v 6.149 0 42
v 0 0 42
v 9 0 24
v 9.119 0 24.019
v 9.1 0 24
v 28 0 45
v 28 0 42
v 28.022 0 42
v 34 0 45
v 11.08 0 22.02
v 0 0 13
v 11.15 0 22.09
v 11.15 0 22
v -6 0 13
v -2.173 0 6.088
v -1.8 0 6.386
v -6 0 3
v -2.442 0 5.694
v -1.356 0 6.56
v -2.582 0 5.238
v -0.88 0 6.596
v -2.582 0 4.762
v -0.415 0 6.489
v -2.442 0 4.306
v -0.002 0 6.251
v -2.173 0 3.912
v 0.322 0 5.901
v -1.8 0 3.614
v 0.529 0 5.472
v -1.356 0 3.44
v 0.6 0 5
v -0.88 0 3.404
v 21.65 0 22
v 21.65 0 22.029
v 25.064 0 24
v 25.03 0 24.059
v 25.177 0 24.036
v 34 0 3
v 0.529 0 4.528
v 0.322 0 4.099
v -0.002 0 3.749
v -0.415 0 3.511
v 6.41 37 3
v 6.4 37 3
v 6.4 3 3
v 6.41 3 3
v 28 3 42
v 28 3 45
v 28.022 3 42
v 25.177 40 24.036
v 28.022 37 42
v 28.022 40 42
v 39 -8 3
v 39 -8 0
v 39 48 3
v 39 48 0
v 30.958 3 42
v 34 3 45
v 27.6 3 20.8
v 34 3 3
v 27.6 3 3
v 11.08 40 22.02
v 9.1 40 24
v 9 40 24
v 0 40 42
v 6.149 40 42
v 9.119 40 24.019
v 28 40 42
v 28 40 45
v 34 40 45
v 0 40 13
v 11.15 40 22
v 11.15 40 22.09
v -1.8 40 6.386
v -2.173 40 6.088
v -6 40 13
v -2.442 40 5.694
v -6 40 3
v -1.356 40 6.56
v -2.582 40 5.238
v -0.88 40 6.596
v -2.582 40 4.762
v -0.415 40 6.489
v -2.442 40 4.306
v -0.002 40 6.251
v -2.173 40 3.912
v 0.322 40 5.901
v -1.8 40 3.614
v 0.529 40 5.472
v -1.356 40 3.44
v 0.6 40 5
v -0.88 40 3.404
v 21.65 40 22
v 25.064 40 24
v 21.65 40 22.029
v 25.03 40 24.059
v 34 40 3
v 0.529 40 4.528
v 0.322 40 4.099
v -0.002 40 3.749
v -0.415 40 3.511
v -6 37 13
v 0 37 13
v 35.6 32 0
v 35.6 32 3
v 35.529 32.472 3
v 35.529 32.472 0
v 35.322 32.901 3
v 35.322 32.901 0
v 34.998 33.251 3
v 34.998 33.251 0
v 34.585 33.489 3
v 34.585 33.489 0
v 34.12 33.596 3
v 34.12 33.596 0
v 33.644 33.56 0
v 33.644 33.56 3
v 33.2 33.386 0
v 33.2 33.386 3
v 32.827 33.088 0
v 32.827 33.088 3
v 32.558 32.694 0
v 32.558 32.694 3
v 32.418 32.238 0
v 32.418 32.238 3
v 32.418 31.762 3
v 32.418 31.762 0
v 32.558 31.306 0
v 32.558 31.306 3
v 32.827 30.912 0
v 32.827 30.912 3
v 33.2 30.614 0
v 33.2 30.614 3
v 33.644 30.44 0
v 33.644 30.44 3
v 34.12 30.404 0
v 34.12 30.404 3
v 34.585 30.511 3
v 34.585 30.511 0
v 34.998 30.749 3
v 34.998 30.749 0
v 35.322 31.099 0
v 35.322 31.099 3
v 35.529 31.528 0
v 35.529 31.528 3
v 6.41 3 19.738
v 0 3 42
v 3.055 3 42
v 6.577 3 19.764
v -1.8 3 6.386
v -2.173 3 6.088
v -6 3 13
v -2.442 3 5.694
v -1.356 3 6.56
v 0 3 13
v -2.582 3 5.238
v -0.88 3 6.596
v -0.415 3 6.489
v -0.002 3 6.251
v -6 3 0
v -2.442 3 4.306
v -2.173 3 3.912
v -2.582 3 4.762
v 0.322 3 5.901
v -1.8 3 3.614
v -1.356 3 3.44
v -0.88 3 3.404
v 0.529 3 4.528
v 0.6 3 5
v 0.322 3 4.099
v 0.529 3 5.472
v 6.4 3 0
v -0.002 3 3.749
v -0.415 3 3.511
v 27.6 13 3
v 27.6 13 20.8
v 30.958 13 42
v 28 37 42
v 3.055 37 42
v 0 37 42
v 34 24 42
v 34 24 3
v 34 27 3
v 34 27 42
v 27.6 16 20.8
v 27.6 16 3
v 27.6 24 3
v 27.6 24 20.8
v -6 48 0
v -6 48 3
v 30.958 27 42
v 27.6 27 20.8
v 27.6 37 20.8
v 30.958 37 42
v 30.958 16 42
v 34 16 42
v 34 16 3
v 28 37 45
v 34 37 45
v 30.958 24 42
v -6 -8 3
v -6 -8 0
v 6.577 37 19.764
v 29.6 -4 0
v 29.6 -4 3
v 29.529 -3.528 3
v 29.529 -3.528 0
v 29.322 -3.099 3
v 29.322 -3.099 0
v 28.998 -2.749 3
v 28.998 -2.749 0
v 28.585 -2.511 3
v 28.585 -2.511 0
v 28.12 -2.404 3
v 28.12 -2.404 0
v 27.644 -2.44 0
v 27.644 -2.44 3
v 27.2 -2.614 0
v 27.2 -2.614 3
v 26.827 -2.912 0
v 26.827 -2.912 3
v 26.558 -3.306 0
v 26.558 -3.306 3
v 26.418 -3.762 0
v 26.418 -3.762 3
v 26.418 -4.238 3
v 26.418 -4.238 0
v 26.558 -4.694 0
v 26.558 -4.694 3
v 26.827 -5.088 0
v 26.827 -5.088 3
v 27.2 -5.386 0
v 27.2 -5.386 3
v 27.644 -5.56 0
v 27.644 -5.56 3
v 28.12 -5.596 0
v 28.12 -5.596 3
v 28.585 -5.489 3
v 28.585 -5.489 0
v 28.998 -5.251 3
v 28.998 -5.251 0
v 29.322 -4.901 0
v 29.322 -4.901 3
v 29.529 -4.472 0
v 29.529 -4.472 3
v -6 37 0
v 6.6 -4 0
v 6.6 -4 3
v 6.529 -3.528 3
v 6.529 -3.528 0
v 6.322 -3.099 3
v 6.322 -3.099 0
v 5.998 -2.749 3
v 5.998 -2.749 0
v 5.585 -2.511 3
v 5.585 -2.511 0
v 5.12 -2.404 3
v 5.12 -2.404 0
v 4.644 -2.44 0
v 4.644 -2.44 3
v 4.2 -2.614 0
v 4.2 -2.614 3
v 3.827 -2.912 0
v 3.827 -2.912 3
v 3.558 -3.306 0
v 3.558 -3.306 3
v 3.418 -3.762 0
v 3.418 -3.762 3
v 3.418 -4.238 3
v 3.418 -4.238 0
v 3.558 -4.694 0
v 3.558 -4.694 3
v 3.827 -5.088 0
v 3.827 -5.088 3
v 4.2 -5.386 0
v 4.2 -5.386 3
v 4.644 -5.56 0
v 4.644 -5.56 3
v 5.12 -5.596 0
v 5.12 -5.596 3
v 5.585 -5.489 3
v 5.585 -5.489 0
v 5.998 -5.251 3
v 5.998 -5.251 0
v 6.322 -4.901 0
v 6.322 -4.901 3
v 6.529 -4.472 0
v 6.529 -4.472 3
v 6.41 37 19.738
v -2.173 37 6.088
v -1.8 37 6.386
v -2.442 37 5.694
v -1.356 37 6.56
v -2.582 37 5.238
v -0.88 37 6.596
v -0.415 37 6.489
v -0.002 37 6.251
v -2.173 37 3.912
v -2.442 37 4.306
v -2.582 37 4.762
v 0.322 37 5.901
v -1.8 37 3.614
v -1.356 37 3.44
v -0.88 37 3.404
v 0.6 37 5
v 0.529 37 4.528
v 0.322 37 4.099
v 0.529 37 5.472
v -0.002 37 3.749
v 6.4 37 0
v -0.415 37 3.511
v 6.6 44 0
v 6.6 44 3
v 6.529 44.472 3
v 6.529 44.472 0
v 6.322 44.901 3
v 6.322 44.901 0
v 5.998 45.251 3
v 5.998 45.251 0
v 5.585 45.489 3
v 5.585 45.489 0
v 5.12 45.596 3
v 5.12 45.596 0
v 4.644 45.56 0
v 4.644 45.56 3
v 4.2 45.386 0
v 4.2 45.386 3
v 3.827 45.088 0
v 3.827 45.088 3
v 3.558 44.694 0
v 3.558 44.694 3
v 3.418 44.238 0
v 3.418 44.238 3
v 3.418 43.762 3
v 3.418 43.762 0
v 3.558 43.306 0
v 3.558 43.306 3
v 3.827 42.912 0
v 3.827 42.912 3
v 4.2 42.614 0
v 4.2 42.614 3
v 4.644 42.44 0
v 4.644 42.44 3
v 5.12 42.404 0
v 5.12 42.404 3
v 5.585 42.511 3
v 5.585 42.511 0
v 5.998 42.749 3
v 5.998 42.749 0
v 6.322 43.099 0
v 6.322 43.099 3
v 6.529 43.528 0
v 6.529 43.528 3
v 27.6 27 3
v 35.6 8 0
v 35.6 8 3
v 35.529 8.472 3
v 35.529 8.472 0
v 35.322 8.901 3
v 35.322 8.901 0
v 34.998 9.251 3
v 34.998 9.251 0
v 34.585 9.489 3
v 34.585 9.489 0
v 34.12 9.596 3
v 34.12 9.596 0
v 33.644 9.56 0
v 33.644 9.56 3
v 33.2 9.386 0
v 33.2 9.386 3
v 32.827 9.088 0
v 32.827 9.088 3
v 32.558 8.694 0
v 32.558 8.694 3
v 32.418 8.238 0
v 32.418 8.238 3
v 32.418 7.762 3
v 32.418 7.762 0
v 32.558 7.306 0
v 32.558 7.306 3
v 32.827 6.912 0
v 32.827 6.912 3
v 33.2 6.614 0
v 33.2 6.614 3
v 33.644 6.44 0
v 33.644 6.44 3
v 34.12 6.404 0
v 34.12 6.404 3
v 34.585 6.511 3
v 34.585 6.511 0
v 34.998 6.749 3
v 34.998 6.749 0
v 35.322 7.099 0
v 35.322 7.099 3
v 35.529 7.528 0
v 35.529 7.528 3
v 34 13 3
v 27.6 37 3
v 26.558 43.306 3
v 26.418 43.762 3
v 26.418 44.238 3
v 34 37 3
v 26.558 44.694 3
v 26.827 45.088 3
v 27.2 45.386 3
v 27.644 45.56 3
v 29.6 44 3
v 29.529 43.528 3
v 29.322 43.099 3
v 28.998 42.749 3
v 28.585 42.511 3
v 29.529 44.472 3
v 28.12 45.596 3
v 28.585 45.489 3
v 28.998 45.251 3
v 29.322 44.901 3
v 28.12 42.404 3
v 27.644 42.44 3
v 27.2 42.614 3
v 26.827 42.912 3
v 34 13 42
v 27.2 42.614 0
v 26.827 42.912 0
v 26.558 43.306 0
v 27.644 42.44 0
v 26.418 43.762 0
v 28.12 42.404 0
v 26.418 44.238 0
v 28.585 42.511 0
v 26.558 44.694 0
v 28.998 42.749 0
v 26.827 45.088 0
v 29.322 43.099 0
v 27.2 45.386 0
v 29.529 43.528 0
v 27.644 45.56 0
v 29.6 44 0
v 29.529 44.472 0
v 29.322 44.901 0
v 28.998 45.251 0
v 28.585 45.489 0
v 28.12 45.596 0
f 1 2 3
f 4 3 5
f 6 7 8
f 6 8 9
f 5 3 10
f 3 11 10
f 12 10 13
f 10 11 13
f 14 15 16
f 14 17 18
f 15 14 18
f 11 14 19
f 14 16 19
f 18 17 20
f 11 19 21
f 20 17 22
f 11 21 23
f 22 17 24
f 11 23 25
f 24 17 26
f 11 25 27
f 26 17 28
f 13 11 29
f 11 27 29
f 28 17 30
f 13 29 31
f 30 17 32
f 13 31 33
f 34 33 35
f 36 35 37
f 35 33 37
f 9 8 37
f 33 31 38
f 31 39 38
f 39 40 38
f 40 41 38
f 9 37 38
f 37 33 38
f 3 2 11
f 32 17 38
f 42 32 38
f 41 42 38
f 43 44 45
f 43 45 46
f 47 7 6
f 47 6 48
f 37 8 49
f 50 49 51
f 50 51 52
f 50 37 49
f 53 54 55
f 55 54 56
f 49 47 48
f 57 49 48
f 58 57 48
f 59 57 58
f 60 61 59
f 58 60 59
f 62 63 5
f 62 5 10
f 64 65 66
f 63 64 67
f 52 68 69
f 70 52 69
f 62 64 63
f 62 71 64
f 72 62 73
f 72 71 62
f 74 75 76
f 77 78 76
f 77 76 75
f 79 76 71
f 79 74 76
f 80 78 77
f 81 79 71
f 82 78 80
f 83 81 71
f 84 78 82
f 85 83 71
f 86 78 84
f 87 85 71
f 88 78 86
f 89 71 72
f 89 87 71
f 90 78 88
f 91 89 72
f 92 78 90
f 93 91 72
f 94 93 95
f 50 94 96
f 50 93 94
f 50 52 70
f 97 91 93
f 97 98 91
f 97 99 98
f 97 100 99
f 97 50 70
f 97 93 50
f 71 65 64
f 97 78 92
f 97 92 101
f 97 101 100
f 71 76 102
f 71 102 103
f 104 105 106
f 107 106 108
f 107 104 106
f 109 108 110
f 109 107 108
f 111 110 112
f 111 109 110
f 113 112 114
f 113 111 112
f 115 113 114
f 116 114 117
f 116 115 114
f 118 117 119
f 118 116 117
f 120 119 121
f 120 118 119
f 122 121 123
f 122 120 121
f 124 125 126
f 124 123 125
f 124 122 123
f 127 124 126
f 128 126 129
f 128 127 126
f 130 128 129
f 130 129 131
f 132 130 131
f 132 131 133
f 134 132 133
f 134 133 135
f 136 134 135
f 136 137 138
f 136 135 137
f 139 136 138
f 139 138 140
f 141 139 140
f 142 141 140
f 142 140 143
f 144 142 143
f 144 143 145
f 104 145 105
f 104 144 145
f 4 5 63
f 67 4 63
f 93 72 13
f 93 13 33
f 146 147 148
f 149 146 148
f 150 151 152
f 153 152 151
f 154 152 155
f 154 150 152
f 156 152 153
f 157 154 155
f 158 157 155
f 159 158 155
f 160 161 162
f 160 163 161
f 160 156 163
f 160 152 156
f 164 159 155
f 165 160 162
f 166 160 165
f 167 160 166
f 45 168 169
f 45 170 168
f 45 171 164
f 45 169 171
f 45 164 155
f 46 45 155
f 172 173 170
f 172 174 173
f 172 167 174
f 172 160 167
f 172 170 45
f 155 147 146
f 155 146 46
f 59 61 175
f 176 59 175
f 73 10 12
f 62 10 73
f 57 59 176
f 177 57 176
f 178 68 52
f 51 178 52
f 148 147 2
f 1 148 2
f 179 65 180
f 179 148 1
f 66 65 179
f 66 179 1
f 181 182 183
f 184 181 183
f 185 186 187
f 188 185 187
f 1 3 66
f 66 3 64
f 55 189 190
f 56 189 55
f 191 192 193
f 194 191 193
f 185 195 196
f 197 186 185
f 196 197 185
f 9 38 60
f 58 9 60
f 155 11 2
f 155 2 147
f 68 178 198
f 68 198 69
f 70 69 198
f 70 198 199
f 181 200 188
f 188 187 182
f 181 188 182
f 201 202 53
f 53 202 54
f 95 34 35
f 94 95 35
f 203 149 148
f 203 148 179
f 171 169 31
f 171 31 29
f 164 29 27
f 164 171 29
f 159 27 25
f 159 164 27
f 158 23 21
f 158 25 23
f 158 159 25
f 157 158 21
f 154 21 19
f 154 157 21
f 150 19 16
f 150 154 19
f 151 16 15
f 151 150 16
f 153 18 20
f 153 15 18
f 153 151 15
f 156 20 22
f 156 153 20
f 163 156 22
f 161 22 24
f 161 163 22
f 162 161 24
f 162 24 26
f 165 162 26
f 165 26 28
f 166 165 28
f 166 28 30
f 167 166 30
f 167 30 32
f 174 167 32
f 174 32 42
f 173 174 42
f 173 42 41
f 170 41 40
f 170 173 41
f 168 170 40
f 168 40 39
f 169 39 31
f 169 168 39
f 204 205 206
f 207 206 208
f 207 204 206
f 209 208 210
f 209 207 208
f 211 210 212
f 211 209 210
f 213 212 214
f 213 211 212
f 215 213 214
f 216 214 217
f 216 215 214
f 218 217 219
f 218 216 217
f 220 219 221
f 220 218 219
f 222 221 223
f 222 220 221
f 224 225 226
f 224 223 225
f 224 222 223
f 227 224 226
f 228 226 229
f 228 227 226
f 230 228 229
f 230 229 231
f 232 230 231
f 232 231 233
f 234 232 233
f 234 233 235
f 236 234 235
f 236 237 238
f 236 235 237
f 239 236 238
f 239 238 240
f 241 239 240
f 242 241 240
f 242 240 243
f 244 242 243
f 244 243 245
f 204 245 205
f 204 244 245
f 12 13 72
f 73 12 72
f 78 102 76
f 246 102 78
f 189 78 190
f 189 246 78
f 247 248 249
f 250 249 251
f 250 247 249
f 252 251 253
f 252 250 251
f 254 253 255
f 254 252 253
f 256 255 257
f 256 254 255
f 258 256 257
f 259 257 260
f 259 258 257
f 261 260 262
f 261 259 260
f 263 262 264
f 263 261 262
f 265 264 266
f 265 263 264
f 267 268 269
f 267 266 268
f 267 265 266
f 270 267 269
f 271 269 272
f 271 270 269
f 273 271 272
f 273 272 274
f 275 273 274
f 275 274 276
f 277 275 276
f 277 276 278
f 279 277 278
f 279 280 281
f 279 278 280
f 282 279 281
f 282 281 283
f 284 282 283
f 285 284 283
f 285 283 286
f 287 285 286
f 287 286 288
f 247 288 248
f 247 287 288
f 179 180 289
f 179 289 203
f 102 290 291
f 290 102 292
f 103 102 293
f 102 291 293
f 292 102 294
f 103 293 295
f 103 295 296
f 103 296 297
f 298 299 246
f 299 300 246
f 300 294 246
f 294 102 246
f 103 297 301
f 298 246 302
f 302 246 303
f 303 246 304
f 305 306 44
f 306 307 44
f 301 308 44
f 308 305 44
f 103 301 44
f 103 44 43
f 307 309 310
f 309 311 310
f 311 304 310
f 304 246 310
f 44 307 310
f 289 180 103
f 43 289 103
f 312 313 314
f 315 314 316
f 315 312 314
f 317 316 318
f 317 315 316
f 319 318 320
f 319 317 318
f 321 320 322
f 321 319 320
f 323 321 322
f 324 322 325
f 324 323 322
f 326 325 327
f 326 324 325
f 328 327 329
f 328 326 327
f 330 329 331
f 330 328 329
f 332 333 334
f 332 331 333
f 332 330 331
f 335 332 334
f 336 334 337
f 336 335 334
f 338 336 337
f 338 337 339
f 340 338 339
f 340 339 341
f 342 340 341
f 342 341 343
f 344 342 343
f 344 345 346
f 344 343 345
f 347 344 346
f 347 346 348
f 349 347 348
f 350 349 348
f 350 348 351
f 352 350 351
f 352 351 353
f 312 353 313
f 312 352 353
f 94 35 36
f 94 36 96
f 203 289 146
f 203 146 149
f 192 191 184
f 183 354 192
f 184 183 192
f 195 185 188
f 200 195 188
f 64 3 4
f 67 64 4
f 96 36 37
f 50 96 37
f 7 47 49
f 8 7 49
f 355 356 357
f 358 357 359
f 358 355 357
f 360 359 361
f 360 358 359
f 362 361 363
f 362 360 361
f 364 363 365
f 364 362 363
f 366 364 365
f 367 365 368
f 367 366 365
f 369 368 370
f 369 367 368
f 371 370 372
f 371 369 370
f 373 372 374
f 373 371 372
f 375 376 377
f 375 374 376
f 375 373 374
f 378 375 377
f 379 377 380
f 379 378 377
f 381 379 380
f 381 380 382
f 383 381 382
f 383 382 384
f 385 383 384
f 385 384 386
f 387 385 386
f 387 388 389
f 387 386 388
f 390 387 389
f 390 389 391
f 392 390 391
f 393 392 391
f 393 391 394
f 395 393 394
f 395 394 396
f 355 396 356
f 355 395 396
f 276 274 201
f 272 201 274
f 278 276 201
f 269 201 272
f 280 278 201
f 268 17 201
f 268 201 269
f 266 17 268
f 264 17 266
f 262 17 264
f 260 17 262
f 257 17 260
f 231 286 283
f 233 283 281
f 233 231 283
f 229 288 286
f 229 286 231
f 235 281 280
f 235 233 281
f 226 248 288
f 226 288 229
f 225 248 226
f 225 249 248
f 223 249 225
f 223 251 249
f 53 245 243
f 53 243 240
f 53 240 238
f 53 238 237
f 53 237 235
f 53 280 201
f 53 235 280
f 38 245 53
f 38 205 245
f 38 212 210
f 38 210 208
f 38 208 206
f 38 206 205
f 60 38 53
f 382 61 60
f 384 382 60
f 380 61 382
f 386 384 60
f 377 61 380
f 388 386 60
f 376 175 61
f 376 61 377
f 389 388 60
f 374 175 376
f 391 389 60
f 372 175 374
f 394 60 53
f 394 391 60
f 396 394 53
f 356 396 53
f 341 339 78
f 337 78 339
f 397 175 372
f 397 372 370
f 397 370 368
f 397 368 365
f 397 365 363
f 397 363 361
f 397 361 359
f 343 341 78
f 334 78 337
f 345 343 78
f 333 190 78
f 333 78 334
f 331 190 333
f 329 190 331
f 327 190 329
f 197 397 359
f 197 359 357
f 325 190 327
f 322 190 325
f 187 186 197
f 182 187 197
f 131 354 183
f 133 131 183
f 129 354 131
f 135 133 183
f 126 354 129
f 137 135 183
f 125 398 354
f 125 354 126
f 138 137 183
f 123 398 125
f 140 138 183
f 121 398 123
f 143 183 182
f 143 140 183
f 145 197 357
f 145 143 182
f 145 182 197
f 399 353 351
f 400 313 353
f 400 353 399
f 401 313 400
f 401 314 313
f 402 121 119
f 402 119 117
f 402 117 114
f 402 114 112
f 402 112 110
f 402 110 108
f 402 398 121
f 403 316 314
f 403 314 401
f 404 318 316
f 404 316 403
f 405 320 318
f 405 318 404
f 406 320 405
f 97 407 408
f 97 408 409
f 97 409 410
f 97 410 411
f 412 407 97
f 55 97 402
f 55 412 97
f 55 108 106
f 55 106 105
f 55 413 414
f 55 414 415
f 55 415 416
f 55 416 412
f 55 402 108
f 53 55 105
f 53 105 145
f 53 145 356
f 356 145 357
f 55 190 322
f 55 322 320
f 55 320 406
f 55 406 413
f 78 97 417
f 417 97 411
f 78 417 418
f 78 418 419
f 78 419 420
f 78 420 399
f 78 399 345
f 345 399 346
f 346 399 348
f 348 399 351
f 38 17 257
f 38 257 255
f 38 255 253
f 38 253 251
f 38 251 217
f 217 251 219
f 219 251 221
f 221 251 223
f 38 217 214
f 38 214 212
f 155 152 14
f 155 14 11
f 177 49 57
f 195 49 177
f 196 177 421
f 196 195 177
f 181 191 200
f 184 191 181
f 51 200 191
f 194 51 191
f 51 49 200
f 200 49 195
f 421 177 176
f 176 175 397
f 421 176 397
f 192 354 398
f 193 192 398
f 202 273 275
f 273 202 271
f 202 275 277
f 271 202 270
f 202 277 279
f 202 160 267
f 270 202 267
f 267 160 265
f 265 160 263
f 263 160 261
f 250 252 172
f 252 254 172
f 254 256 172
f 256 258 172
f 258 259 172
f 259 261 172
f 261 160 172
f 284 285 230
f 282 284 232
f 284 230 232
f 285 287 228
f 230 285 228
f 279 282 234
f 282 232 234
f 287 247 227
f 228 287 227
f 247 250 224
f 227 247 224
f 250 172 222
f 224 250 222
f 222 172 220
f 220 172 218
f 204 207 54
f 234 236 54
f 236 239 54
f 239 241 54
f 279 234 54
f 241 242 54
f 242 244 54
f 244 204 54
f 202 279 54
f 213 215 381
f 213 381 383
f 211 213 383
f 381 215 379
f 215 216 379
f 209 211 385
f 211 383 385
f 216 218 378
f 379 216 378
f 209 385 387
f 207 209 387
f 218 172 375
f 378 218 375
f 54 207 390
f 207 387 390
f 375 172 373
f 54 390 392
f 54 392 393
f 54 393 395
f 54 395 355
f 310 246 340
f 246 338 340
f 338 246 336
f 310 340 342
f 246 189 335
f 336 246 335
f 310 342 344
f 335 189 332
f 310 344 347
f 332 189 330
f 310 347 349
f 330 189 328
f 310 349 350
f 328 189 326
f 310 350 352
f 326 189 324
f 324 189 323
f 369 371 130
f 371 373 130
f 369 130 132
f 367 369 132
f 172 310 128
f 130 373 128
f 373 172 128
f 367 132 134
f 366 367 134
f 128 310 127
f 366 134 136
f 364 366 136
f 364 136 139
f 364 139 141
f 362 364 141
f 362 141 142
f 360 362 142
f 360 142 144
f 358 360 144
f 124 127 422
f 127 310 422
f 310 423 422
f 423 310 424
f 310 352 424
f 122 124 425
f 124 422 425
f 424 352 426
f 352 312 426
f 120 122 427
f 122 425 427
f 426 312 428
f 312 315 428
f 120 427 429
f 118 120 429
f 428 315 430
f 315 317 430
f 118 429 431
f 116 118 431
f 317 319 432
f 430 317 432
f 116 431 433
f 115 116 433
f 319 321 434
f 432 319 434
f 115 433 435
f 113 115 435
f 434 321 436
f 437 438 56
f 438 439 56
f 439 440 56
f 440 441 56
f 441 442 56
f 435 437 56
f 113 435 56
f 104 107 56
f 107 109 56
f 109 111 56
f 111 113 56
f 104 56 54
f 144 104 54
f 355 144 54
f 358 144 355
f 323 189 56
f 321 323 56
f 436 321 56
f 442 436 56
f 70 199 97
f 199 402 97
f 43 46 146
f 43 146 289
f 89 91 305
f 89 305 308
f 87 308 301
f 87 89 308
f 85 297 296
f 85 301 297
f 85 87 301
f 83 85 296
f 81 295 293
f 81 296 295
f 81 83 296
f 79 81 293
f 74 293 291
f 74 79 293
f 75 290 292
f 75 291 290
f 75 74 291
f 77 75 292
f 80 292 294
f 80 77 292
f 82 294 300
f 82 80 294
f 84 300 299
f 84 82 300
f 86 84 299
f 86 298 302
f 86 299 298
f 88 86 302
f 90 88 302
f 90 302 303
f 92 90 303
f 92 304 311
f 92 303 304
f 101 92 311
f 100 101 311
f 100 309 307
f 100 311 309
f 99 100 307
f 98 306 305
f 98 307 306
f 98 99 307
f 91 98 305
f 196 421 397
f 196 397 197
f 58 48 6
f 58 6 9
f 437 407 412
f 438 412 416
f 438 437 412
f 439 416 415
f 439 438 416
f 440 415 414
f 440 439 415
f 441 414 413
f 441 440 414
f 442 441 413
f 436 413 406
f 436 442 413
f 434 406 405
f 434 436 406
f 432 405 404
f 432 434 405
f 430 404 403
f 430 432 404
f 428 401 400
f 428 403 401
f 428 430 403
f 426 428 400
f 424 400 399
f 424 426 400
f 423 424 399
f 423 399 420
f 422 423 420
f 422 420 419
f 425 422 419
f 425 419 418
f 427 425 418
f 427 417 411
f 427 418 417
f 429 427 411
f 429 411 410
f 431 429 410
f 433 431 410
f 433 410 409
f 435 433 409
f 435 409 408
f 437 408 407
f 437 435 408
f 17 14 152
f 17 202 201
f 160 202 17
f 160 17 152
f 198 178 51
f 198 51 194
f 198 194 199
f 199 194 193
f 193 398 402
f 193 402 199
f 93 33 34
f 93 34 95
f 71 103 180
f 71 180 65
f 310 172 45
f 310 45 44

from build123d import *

# Parameters (mm, degrees)
CYLINDER007_R          = 1.6
CYLINDER007_DEPTH      = 10
CYLINDER006_R          = 1.6
CYLINDER006_DEPTH      = 10
CYLINDER005_R          = 1.6
CYLINDER005_DEPTH      = 10
CYLINDER004_R          = 1.6
CYLINDER004_DEPTH      = 10
CYLINDER_R             = 1.6
CYLINDER_DEPTH         = 50
CYLINDER_ROLL_ANGLE    = 90
BOX024_W               = 6
BOX024_H               = 3
BOX024_DEPTH           = 10
BOX023_W               = 6
BOX023_H               = 3
BOX023_DEPTH           = 10
BOX021_W               = 6
BOX021_H               = 3
BOX021_DEPTH           = 3
BOX022_W               = 13
BOX022_H               = 34
BOX022_DEPTH           = 3
CYLINDER003_R          = 1.6
CYLINDER003_DEPTH      = 10
CYLINDER002_R          = 1.6
CYLINDER002_DEPTH      = 10
BOX019_W               = 45
BOX019_H               = 56
BOX019_DEPTH           = 3
BOX018_W               = 10
BOX018_H               = 10
BOX018_DEPTH           = 23
BOX018_PITCH_ANGLE     = 9
BOX013_W               = 8.6
BOX013_H               = 10
BOX013_DEPTH           = 17.8
BOX017_W               = 10
BOX017_H               = 8
BOX017_DEPTH           = 23
BOX017_PITCH_ANGLE     = 9
BOX012_W               = 8.6
BOX012_H               = 8
BOX012_DEPTH           = 17.8
BOX016_W               = 10
BOX016_H               = 10
BOX016_DEPTH           = 23
BOX016_PITCH_ANGLE     = 9
BOX011_W               = 8.6
BOX011_H               = 10
BOX011_DEPTH           = 17.8
BOX008_W               = 10
BOX008_H               = 34
BOX008_DEPTH           = 23
BOX008_PITCH_ANGLE     = -9
BOX007_W               = 8.6
BOX007_H               = 34
BOX007_DEPTH           = 17.8
BOX006_W               = 4
BOX006_H               = 40
BOX006_DEPTH           = 3
BOX006_PLACEMENT_ANGLE = 30
BOX004_W               = 10
BOX004_H               = 40
BOX004_DEPTH           = 19
BOX004_PITCH_ANGLE     = 9
BOX005_W               = 2.8
BOX005_H               = 40
BOX005_DEPTH           = 2.8
BOX005_PITCH_ANGLE     = 45
BOX003_W               = 7
BOX003_H               = 40
BOX003_DEPTH           = 19
BOX003_PITCH_ANGLE     = -9
BOX001_W               = 10.5
BOX001_H               = 40
BOX001_DEPTH           = 20
BOX_W                  = 34
BOX_H                  = 40
BOX_DEPTH              = 42
BOX020_W               = 6
BOX020_H               = 3
BOX020_DEPTH           = 3


with BuildPart() as cylinder007:
    # Cylinder007 → Cylinder007 (new body)
    with BuildSketch(Plane(origin=(28, 44, 0), x_dir=(1, 0, 0), z_dir=(0, 0, 1))):
        Circle(CYLINDER007_R)
    extrude(amount=CYLINDER007_DEPTH)


with BuildPart() as cylinder006:
    # Cylinder006 → Cylinder006 (new body)
    with BuildSketch(Plane(origin=(5, 44, 0), x_dir=(1, 0, 0), z_dir=(0, 0, 1))):
        Circle(CYLINDER006_R)
    extrude(amount=CYLINDER006_DEPTH)


with BuildPart() as cylinder005:
    # Cylinder005 → Cylinder005 (new body)
    with BuildSketch(Plane(origin=(28, -4, 0), x_dir=(1, 0, 0), z_dir=(0, 0, 1))):
        Circle(CYLINDER005_R)
    extrude(amount=CYLINDER005_DEPTH)


with BuildPart() as cylinder004:
    # Cylinder004 → Cylinder004 (new body)
    with BuildSketch(Plane(origin=(5, -4, 0), x_dir=(1, 0, 0), z_dir=(0, 0, 1))):
        Circle(CYLINDER004_R)
    extrude(amount=CYLINDER004_DEPTH)


with BuildPart() as cylinder:
    # Cylinder → Cylinder (new body)
    with BuildSketch(Plane.XY):
        Circle(CYLINDER_R)
    extrude(amount=CYLINDER_DEPTH)


with BuildPart() as cylinder_1:
    # Cylinder roll: moved
    add(cylinder.part.rotate(Axis((0, 0, 0), (1, 0, 0)), CYLINDER_ROLL_ANGLE))


with BuildPart() as cylinder_2:
    # Cylinder placement: moved
    add(cylinder_1.part.moved(Location((-1, 45, 5))))


with BuildPart() as cube024:
    # Box024 → Box024 (new body)
    with BuildSketch(Plane(origin=(-6, 37, 3), x_dir=(1, 0, 0), z_dir=(0, 0, 1))):
        with Locations((3, 1.5)):
            Rectangle(BOX024_W, BOX024_H)
    extrude(amount=BOX024_DEPTH)


with BuildPart() as cube023:
    # Box023 → Box023 (new body)
    with BuildSketch(Plane(origin=(-6, 0, 3), x_dir=(1, 0, 0), z_dir=(0, 0, 1))):
        with Locations((3, 1.5)):
            Rectangle(BOX023_W, BOX023_H)
    extrude(amount=BOX023_DEPTH)


with BuildPart() as cube021:
    # Box021 → Box021 (new body)
    with BuildSketch(Plane(origin=(28, 37, 42), x_dir=(1, 0, 0), z_dir=(0, 0, 1))):
        with Locations((3, 1.5)):
            Rectangle(BOX021_W, BOX021_H)
    extrude(amount=BOX021_DEPTH)


with BuildPart() as cube022:
    # Box022 → Box022 (new body)
    with BuildSketch(Plane(origin=(-6.6, 3, 0), x_dir=(1, 0, 0), z_dir=(0, 0, 1))):
        with Locations((6.5, 17)):
            Rectangle(BOX022_W, BOX022_H)
    extrude(amount=BOX022_DEPTH)


with BuildPart() as cylinder003:
    # Cylinder003 → Cylinder003 (new body)
    with BuildSketch(Plane(origin=(34, 32, 0), x_dir=(1, 0, 0), z_dir=(0, 0, 1))):
        Circle(CYLINDER003_R)
    extrude(amount=CYLINDER003_DEPTH)


with BuildPart() as cylinder002:
    # Cylinder002 → Cylinder002 (new body)
    with BuildSketch(Plane(origin=(34, 8, 0), x_dir=(1, 0, 0), z_dir=(0, 0, 1))):
        Circle(CYLINDER002_R)
    extrude(amount=CYLINDER002_DEPTH)


with BuildPart() as cube019:
    # Box019 → Box019 (new body)
    with BuildSketch(Plane(origin=(-6, -8, 0), x_dir=(1, 0, 0), z_dir=(0, 0, 1))):
        with Locations((22.5, 28)):
            Rectangle(BOX019_W, BOX019_H)
    extrude(amount=BOX019_DEPTH)


with BuildPart() as cube018:
    # Box018 → Box018 (new body)
    with BuildSketch(Plane.XY):
        with Locations((5, 5)):
            Rectangle(BOX018_W, BOX018_H)
    extrude(amount=BOX018_DEPTH)


with BuildPart() as cube018_1:
    # Box018 pitch: moved
    add(cube018.part.rotate(Axis((0, 0, 0), (0, 1, 0)), BOX018_PITCH_ANGLE))


with BuildPart() as cube018_2:
    # Box018 placement: moved
    add(cube018_1.part.moved(Location((27.6, 3, 20.8))))


with BuildPart() as cube013:
    # Box013 → Box013 (new body)
    with BuildSketch(Plane(origin=(27.6, 3, 3), x_dir=(1, 0, 0), z_dir=(0, 0, 1))):
        with Locations((4.3, 5)):
            Rectangle(BOX013_W, BOX013_H)
    extrude(amount=BOX013_DEPTH)


with BuildPart() as cube017:
    # Box017 → Box017 (new body)
    with BuildSketch(Plane.XY):
        with Locations((5, 4)):
            Rectangle(BOX017_W, BOX017_H)
    extrude(amount=BOX017_DEPTH)


with BuildPart() as cube017_1:
    # Box017 pitch: moved
    add(cube017.part.rotate(Axis((0, 0, 0), (0, 1, 0)), BOX017_PITCH_ANGLE))


with BuildPart() as cube017_2:
    # Box017 placement: moved
    add(cube017_1.part.moved(Location((27.6, 16, 20.8))))


with BuildPart() as cube012:
    # Box012 → Box012 (new body)
    with BuildSketch(Plane(origin=(27.6, 16, 3), x_dir=(1, 0, 0), z_dir=(0, 0, 1))):
        with Locations((4.3, 4)):
            Rectangle(BOX012_W, BOX012_H)
    extrude(amount=BOX012_DEPTH)


with BuildPart() as cube016:
    # Box016 → Box016 (new body)
    with BuildSketch(Plane.XY):
        with Locations((5, 5)):
            Rectangle(BOX016_W, BOX016_H)
    extrude(amount=BOX016_DEPTH)


with BuildPart() as cube016_1:
    # Box016 pitch: moved
    add(cube016.part.rotate(Axis((0, 0, 0), (0, 1, 0)), BOX016_PITCH_ANGLE))


with BuildPart() as cube016_2:
    # Box016 placement: moved
    add(cube016_1.part.moved(Location((27.6, 27, 20.8))))


with BuildPart() as cube011:
    # Box011 → Box011 (new body)
    with BuildSketch(Plane(origin=(27.6, 27, 3), x_dir=(1, 0, 0), z_dir=(0, 0, 1))):
        with Locations((4.3, 5)):
            Rectangle(BOX011_W, BOX011_H)
    extrude(amount=BOX011_DEPTH)


with BuildPart() as cube008:
    # Box008 → Box008 (new body)
    with BuildSketch(Plane.XY):
        with Locations((5, 17)):
            Rectangle(BOX008_W, BOX008_H)
    extrude(amount=BOX008_DEPTH)


with BuildPart() as cube008_1:
    # Box008 pitch: moved
    add(cube008.part.rotate(Axis((0, 0, 0), (0, 1, 0)), BOX008_PITCH_ANGLE))


with BuildPart() as cube008_2:
    # Box008 placement: moved
    add(cube008_1.part.moved(Location((-3.3, 3, 18.2))))


with BuildPart() as cube007:
    # Box007 → Box007 (new body)
    with BuildSketch(Plane(origin=(-2.19, 3, 3), x_dir=(1, 0, 0), z_dir=(0, 0, 1))):
        with Locations((4.3, 17)):
            Rectangle(BOX007_W, BOX007_H)
    extrude(amount=BOX007_DEPTH)


with BuildPart() as cube006:
    # Box006 → Box006 (new body)
    with BuildSketch(Plane.XY):
        with Locations((2, 20)):
            Rectangle(BOX006_W, BOX006_H)
    extrude(amount=BOX006_DEPTH)


with BuildPart() as cube006_1:
    # Box006 placement: moved
    add(cube006.part.moved(Location((21.6, 0, 22))).rotate(Axis((21.6, 0, 22), (0, -1, 0)), BOX006_PLACEMENT_ANGLE))


with BuildPart() as cube004:
    # Box004 → Box004 (new body)
    with BuildSketch(Plane.XY):
        with Locations((5, 20)):
            Rectangle(BOX004_W, BOX004_H)
    extrude(amount=BOX004_DEPTH)


with BuildPart() as cube004_1:
    # Box004 pitch: moved
    add(cube004.part.rotate(Axis((0, 0, 0), (0, 1, 0)), BOX004_PITCH_ANGLE))


with BuildPart() as cube004_2:
    # Box004 placement: moved
    add(cube004_1.part.moved(Location((15.3, 0, 25.6))))


with BuildPart() as cube005:
    # Box005 → Box005 (new body)
    with BuildSketch(Plane.XY):
        with Locations((1.4, 20)):
            Rectangle(BOX005_W, BOX005_H)
    extrude(amount=BOX005_DEPTH)


with BuildPart() as cube005_1:
    # Box005 pitch: moved
    add(cube005.part.rotate(Axis((0, 0, 0), (0, 1, 0)), BOX005_PITCH_ANGLE))


with BuildPart() as cube005_2:
    # Box005 placement: moved
    add(cube005_1.part.moved(Location((9.1, 0, 24))))


with BuildPart() as cube003:
    # Box003 → Box003 (new body)
    with BuildSketch(Plane.XY):
        with Locations((3.5, 20)):
            Rectangle(BOX003_W, BOX003_H)
    extrude(amount=BOX003_DEPTH)


with BuildPart() as cube003_1:
    # Box003 pitch: moved
    add(cube003.part.rotate(Axis((0, 0, 0), (0, 1, 0)), BOX003_PITCH_ANGLE))


with BuildPart() as cube003_2:
    # Box003 placement: moved
    add(cube003_1.part.moved(Location((9, 0, 24))))


with BuildPart() as cube001:
    # Box001 → Box001 (new body)
    with BuildSketch(Plane(origin=(11.15, 0, 22), x_dir=(1, 0, 0), z_dir=(0, 0, 1))):
        with Locations((5.25, 20)):
            Rectangle(BOX001_W, BOX001_H)
    extrude(amount=BOX001_DEPTH)


with BuildPart() as cut021:
    # Box → Box (new body)
    with BuildSketch(Plane.XY):
        with Locations((17, 20)):
            Rectangle(BOX_W, BOX_H)
    extrude(amount=BOX_DEPTH)

    # Cut: cut Cube001
    add(cube001.part, mode=Mode.SUBTRACT)

    # Cut001: cut Cube003
    add(cube003_2.part, mode=Mode.SUBTRACT)

    # Cut002: cut Cube005
    add(cube005_2.part, mode=Mode.SUBTRACT)

    # Cut003: cut Cube004
    add(cube004_2.part, mode=Mode.SUBTRACT)

    # Cut004: cut Cube006
    add(cube006_1.part, mode=Mode.SUBTRACT)

    # Cut005: cut Cube007
    add(cube007.part, mode=Mode.SUBTRACT)

    # Cut006: cut Cube008
    add(cube008_2.part, mode=Mode.SUBTRACT)

    # Cut011: cut Cube011
    add(cube011.part, mode=Mode.SUBTRACT)

    # Cut012: cut Cube016
    add(cube016_2.part, mode=Mode.SUBTRACT)

    # Cut013: cut Cube012
    add(cube012.part, mode=Mode.SUBTRACT)

    # Cut014: cut Cube017
    add(cube017_2.part, mode=Mode.SUBTRACT)

    # Cut015: cut Cube013
    add(cube013.part, mode=Mode.SUBTRACT)

    # Cut016: cut Cube018
    add(cube018_2.part, mode=Mode.SUBTRACT)

    # Fusion: union Cube019
    add(cube019.part)

    # Cut019: cut Cylinder002
    add(cylinder002.part, mode=Mode.SUBTRACT)

    # Cut020: cut Cylinder003
    add(cylinder003.part, mode=Mode.SUBTRACT)

    # Cut021: cut Cube022
    add(cube022.part, mode=Mode.SUBTRACT)


with BuildPart() as cut026:
    # Box020 → Box020 (new body)
    with BuildSketch(Plane(origin=(28, 0, 42), x_dir=(1, 0, 0), z_dir=(0, 0, 1))):
        with Locations((3, 1.5)):
            Rectangle(BOX020_W, BOX020_H)
    extrude(amount=BOX020_DEPTH)

    # Fusion001: union Cut021
    add(cut021.part)

    # Fusion002: union Cube021
    add(cube021.part)

    # Fusion003: union Cube023
    add(cube023.part)

    # Fusion004: union Cube024
    add(cube024.part)

    # Cut022: cut Cylinder
    add(cylinder_2.part, mode=Mode.SUBTRACT)

    # Cut023: cut Cylinder004
    add(cylinder004.part, mode=Mode.SUBTRACT)

    # Cut024: cut Cylinder005
    add(cylinder005.part, mode=Mode.SUBTRACT)

    # Cut025: cut Cylinder006
    add(cylinder006.part, mode=Mode.SUBTRACT)

    # Cut026: cut Cylinder007
    add(cylinder007.part, mode=Mode.SUBTRACT)


solid = cut026.part
